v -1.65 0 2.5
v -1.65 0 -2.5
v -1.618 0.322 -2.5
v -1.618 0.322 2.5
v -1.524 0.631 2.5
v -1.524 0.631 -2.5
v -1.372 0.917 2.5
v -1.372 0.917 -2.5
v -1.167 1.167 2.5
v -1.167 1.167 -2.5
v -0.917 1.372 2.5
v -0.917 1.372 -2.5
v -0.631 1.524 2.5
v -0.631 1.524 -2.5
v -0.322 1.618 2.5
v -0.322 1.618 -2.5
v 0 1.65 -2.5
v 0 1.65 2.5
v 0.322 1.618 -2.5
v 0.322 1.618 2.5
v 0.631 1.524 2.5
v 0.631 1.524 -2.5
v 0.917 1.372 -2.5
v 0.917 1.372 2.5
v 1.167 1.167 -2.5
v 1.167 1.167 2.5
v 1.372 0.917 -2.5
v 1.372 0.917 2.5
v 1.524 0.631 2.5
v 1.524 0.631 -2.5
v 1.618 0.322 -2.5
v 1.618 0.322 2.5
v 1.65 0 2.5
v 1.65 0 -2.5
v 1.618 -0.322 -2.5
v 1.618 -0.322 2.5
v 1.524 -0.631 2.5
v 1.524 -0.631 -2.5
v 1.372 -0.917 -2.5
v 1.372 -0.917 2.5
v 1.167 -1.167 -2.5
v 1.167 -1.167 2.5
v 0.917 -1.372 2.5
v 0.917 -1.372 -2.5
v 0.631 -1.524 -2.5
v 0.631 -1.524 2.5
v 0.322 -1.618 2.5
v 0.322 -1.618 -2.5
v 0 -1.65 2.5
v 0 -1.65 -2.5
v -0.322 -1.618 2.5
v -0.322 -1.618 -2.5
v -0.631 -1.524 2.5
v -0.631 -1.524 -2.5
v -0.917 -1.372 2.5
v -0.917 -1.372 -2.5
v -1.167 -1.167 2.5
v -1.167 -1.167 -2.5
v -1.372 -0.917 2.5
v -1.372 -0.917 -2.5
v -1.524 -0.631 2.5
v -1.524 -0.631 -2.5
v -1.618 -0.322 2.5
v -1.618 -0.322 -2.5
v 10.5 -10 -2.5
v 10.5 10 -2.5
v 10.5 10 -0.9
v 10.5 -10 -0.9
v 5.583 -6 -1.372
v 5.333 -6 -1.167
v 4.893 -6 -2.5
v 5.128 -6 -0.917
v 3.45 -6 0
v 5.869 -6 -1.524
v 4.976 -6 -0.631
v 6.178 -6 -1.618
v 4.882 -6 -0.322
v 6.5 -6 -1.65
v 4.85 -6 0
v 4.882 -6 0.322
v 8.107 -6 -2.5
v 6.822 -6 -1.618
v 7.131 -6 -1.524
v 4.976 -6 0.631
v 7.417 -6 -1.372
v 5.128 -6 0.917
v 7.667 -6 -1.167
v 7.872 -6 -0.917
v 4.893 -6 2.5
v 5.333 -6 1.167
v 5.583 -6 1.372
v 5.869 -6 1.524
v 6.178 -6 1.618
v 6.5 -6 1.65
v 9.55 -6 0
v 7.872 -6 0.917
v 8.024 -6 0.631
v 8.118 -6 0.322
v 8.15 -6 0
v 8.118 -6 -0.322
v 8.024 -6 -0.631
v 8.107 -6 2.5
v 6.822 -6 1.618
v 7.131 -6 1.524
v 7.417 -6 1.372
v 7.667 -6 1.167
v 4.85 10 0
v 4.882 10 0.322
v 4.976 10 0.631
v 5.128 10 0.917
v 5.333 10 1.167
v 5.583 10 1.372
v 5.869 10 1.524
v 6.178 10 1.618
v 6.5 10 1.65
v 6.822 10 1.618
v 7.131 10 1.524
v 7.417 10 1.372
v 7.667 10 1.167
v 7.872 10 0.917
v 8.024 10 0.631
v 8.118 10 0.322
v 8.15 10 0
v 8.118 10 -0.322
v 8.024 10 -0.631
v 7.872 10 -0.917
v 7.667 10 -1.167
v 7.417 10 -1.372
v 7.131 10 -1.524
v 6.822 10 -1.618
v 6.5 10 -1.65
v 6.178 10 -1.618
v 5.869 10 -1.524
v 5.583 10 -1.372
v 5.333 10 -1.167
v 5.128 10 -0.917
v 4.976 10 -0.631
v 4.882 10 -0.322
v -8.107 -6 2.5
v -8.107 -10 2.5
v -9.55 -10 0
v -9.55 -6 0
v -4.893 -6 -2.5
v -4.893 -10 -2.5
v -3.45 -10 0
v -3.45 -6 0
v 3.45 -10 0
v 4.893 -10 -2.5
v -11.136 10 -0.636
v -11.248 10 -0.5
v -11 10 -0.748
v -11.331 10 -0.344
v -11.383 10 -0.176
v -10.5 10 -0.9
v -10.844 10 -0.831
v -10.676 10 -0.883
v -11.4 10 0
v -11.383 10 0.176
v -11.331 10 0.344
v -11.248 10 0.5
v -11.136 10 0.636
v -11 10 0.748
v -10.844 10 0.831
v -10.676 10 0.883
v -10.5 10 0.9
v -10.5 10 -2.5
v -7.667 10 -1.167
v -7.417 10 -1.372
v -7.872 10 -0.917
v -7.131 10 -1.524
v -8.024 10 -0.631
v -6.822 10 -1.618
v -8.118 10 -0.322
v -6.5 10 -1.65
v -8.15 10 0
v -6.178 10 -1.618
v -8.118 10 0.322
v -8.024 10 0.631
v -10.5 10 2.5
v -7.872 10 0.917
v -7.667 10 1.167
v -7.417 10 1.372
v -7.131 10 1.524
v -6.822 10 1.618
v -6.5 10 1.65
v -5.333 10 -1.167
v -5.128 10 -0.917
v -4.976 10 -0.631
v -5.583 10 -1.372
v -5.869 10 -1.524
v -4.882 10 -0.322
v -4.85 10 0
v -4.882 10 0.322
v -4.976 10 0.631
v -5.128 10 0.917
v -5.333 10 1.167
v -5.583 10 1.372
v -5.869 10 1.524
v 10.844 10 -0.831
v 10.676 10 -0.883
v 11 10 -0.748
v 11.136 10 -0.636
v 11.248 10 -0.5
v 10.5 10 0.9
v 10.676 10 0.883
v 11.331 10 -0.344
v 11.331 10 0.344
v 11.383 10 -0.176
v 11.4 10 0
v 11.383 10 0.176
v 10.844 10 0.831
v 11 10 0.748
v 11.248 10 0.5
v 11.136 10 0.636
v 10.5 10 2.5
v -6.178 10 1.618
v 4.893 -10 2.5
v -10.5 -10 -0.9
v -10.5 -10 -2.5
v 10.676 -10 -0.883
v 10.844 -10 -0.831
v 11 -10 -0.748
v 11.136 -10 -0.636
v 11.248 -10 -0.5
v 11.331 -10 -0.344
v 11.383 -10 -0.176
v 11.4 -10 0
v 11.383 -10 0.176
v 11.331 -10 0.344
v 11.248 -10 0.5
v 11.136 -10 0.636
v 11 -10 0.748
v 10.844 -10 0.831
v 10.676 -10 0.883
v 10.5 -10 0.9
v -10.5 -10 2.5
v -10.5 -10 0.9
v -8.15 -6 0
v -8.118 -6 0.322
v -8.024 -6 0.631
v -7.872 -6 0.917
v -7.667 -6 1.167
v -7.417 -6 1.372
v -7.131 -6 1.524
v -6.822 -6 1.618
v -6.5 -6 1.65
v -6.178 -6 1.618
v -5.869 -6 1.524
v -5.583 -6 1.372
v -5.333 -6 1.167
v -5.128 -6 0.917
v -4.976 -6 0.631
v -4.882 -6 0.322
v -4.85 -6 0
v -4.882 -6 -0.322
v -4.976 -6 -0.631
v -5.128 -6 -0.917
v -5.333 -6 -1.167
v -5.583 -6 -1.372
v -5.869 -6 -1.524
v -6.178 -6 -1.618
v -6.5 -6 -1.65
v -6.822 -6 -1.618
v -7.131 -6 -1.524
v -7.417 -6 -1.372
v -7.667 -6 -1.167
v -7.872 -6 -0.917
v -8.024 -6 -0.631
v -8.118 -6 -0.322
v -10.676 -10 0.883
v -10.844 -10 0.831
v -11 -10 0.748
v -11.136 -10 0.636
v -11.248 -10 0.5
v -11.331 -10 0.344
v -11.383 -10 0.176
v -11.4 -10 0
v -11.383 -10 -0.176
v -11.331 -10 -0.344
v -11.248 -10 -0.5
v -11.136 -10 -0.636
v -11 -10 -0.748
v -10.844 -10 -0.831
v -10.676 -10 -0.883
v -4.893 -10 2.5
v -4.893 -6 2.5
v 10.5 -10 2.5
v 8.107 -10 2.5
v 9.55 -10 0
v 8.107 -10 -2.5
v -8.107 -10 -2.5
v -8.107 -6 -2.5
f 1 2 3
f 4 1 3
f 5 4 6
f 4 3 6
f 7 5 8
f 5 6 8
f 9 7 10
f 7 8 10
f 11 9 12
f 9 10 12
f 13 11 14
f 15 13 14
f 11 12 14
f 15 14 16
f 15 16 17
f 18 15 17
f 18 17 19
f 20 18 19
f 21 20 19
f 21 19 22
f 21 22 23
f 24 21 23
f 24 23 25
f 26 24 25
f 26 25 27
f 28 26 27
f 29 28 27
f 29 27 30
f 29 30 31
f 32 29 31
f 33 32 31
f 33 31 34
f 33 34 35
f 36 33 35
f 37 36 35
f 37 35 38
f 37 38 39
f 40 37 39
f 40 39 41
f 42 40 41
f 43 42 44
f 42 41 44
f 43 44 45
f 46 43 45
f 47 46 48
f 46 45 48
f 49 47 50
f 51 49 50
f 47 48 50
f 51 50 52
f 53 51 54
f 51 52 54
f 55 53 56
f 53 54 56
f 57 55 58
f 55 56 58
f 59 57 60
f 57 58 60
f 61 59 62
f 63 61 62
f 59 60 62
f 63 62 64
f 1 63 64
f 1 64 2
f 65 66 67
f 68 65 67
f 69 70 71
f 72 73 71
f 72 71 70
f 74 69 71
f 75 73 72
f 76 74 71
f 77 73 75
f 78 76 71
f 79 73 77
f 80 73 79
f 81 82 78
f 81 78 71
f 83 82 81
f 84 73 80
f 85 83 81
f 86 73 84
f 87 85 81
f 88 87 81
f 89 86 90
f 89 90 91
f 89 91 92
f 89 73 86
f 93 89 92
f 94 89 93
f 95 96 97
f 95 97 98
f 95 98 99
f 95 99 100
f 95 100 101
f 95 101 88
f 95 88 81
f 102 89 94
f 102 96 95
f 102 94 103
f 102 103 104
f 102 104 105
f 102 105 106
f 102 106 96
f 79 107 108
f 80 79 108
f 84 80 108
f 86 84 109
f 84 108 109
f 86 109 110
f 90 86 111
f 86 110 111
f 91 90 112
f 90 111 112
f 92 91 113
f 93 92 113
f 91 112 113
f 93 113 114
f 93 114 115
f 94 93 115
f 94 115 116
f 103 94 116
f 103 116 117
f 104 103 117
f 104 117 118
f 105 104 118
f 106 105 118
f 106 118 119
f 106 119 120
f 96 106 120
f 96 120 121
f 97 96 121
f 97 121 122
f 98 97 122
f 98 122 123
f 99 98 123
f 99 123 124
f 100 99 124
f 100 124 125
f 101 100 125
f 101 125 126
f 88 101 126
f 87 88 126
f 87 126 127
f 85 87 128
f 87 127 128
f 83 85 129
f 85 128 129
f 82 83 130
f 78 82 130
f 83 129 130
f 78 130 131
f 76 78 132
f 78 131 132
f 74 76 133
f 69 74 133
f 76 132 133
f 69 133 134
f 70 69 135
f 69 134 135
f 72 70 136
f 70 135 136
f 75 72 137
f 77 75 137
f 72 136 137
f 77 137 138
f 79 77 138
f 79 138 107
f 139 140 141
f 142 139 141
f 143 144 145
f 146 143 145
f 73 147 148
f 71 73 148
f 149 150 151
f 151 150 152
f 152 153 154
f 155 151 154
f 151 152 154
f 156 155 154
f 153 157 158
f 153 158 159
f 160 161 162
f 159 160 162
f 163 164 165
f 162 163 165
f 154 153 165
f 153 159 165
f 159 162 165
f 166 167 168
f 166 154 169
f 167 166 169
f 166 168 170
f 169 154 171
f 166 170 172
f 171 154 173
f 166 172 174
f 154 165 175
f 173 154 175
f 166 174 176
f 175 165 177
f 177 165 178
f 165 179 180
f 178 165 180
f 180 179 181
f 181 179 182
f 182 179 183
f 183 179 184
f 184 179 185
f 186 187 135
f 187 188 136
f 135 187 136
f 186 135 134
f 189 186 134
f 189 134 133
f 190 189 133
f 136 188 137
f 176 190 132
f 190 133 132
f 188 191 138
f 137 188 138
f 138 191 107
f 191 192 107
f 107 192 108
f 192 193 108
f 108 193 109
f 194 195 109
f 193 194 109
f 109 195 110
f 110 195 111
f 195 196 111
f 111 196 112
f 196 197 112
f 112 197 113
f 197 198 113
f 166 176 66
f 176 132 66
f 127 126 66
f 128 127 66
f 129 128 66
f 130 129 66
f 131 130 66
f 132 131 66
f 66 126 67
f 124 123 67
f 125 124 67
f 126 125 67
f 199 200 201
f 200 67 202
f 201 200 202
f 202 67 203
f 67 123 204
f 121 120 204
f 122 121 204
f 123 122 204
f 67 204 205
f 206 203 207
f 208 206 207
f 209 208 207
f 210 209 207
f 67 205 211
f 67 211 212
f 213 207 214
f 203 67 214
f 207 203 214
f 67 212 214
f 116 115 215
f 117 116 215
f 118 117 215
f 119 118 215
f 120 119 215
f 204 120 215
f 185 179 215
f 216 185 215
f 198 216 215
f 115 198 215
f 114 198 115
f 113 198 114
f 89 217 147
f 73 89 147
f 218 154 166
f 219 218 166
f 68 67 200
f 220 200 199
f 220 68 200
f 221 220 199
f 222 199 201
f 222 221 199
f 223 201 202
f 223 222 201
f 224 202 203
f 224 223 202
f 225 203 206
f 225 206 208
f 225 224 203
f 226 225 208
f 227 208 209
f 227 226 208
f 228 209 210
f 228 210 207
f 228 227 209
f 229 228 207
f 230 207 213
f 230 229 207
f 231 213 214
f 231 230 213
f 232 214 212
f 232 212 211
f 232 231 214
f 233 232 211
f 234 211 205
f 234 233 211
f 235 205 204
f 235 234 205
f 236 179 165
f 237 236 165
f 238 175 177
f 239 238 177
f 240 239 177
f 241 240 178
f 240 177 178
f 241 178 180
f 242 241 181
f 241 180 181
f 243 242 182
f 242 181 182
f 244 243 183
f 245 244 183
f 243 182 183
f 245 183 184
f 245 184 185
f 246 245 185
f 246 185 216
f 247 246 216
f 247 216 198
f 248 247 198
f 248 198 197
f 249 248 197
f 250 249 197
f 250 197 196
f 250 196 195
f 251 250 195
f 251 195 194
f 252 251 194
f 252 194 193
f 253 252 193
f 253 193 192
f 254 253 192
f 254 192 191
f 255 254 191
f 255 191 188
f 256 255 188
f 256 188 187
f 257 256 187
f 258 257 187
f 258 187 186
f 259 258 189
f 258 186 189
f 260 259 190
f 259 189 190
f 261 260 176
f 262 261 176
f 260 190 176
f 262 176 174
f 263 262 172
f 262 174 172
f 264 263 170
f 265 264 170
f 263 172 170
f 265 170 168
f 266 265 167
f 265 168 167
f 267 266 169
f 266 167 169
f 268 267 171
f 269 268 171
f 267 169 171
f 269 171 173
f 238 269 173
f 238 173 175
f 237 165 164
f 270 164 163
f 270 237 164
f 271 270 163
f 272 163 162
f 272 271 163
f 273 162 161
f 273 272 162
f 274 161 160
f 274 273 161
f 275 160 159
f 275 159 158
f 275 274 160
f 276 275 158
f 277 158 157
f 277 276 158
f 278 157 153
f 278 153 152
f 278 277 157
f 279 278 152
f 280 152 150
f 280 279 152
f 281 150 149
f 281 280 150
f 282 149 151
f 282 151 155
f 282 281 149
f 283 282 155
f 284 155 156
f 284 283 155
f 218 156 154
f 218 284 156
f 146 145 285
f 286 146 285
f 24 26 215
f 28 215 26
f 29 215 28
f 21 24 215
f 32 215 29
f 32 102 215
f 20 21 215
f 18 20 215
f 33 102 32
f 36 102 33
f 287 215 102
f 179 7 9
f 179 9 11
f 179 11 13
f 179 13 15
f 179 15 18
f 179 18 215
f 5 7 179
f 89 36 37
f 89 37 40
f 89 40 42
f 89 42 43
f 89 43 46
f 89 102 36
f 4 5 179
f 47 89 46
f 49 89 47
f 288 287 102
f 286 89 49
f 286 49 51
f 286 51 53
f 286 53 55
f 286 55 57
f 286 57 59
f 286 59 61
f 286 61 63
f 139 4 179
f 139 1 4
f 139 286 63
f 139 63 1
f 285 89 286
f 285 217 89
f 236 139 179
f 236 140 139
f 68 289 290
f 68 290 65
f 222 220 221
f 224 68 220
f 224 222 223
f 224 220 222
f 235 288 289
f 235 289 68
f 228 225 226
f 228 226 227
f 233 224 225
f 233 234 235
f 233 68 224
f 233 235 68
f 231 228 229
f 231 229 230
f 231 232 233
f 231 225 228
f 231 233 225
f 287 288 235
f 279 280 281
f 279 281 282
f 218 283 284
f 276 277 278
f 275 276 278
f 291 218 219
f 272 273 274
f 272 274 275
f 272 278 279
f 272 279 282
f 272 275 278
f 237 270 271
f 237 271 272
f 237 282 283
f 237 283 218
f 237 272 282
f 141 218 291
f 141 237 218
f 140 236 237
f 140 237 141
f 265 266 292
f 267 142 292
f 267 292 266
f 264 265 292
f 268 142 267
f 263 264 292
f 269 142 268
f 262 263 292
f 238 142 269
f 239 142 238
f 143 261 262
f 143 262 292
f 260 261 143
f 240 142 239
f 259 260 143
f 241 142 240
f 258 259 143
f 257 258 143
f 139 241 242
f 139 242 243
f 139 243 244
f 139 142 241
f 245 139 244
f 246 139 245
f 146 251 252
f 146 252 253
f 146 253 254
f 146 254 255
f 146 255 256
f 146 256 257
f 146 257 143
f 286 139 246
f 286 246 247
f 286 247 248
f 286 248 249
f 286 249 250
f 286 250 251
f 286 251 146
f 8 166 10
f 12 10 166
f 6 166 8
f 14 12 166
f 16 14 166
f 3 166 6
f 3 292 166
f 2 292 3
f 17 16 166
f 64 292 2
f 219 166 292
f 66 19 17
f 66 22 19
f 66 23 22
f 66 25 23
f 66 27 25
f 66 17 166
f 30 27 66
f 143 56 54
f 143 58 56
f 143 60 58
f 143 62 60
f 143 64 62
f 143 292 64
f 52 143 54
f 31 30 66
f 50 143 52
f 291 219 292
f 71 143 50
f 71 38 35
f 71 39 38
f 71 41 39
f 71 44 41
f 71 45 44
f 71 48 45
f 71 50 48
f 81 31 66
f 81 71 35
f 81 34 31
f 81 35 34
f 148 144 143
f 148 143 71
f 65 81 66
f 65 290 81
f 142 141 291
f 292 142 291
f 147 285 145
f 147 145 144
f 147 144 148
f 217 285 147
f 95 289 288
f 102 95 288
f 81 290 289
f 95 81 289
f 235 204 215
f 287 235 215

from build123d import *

# Parameters (mm, degrees)
F1_DEPTH = 10
F3_D     = 3.3
F5_D     = 3.3
F6_DEPTH = 4


with BuildPart() as f1:
    # F0 (on Front) → F1 (new body, symmetric)
    with BuildSketch(Plane.XZ):
        Polygon((10.5, 0.9), (10.5, 2.5), (-10.5, 2.5), (-10.5, 0.9), (-10.5, -0.9), (-10.5, -2.5), (10.5, -2.5), (10.5, -0.9), align=None)
        with BuildLine():
            ThreePointArc((10.5, -0.9), (11.4, 0), (10.5, 0.9))
            Line((10.5, 0.9), (10.5, -0.9))
        make_face()
        with BuildLine():
            Line((-10.5, -0.9), (-10.5, 0.9))
            ThreePointArc((-10.5, 0.9), (-11.4, 0), (-10.5, -0.9))
        make_face()
    extrude(amount=F1_DEPTH, both=True)

    # F3 (through all)
    with Locations(Plane.XY.offset(2.5)):
        with Locations((0, 0)):
            Hole(F3_D / 2)

    # F5 (through all)
    with Locations(Plane.XZ.offset(10)):
        with Locations((-6.5, 0), (6.5, 0)):
            Hole(F5_D / 2)

    # F4 (on face) → F6 (cut)
    with BuildSketch(Plane.XZ.offset(10)):
        Polygon((-3.45, 0), (-4.975, 2.6413774815), (-8.025, 2.6413774815), (-9.55, 0), (-8.025, -2.6413774815), (-4.975, -2.6413774815), align=None)
        Polygon((4.975, 2.6413774815), (3.45, 0), (4.975, -2.6413774815), (8.025, -2.6413774815), (9.55, 0), (8.025, 2.6413774815), align=None)
    extrude(amount=-F6_DEPTH, mode=Mode.SUBTRACT)


solid = f1.part
